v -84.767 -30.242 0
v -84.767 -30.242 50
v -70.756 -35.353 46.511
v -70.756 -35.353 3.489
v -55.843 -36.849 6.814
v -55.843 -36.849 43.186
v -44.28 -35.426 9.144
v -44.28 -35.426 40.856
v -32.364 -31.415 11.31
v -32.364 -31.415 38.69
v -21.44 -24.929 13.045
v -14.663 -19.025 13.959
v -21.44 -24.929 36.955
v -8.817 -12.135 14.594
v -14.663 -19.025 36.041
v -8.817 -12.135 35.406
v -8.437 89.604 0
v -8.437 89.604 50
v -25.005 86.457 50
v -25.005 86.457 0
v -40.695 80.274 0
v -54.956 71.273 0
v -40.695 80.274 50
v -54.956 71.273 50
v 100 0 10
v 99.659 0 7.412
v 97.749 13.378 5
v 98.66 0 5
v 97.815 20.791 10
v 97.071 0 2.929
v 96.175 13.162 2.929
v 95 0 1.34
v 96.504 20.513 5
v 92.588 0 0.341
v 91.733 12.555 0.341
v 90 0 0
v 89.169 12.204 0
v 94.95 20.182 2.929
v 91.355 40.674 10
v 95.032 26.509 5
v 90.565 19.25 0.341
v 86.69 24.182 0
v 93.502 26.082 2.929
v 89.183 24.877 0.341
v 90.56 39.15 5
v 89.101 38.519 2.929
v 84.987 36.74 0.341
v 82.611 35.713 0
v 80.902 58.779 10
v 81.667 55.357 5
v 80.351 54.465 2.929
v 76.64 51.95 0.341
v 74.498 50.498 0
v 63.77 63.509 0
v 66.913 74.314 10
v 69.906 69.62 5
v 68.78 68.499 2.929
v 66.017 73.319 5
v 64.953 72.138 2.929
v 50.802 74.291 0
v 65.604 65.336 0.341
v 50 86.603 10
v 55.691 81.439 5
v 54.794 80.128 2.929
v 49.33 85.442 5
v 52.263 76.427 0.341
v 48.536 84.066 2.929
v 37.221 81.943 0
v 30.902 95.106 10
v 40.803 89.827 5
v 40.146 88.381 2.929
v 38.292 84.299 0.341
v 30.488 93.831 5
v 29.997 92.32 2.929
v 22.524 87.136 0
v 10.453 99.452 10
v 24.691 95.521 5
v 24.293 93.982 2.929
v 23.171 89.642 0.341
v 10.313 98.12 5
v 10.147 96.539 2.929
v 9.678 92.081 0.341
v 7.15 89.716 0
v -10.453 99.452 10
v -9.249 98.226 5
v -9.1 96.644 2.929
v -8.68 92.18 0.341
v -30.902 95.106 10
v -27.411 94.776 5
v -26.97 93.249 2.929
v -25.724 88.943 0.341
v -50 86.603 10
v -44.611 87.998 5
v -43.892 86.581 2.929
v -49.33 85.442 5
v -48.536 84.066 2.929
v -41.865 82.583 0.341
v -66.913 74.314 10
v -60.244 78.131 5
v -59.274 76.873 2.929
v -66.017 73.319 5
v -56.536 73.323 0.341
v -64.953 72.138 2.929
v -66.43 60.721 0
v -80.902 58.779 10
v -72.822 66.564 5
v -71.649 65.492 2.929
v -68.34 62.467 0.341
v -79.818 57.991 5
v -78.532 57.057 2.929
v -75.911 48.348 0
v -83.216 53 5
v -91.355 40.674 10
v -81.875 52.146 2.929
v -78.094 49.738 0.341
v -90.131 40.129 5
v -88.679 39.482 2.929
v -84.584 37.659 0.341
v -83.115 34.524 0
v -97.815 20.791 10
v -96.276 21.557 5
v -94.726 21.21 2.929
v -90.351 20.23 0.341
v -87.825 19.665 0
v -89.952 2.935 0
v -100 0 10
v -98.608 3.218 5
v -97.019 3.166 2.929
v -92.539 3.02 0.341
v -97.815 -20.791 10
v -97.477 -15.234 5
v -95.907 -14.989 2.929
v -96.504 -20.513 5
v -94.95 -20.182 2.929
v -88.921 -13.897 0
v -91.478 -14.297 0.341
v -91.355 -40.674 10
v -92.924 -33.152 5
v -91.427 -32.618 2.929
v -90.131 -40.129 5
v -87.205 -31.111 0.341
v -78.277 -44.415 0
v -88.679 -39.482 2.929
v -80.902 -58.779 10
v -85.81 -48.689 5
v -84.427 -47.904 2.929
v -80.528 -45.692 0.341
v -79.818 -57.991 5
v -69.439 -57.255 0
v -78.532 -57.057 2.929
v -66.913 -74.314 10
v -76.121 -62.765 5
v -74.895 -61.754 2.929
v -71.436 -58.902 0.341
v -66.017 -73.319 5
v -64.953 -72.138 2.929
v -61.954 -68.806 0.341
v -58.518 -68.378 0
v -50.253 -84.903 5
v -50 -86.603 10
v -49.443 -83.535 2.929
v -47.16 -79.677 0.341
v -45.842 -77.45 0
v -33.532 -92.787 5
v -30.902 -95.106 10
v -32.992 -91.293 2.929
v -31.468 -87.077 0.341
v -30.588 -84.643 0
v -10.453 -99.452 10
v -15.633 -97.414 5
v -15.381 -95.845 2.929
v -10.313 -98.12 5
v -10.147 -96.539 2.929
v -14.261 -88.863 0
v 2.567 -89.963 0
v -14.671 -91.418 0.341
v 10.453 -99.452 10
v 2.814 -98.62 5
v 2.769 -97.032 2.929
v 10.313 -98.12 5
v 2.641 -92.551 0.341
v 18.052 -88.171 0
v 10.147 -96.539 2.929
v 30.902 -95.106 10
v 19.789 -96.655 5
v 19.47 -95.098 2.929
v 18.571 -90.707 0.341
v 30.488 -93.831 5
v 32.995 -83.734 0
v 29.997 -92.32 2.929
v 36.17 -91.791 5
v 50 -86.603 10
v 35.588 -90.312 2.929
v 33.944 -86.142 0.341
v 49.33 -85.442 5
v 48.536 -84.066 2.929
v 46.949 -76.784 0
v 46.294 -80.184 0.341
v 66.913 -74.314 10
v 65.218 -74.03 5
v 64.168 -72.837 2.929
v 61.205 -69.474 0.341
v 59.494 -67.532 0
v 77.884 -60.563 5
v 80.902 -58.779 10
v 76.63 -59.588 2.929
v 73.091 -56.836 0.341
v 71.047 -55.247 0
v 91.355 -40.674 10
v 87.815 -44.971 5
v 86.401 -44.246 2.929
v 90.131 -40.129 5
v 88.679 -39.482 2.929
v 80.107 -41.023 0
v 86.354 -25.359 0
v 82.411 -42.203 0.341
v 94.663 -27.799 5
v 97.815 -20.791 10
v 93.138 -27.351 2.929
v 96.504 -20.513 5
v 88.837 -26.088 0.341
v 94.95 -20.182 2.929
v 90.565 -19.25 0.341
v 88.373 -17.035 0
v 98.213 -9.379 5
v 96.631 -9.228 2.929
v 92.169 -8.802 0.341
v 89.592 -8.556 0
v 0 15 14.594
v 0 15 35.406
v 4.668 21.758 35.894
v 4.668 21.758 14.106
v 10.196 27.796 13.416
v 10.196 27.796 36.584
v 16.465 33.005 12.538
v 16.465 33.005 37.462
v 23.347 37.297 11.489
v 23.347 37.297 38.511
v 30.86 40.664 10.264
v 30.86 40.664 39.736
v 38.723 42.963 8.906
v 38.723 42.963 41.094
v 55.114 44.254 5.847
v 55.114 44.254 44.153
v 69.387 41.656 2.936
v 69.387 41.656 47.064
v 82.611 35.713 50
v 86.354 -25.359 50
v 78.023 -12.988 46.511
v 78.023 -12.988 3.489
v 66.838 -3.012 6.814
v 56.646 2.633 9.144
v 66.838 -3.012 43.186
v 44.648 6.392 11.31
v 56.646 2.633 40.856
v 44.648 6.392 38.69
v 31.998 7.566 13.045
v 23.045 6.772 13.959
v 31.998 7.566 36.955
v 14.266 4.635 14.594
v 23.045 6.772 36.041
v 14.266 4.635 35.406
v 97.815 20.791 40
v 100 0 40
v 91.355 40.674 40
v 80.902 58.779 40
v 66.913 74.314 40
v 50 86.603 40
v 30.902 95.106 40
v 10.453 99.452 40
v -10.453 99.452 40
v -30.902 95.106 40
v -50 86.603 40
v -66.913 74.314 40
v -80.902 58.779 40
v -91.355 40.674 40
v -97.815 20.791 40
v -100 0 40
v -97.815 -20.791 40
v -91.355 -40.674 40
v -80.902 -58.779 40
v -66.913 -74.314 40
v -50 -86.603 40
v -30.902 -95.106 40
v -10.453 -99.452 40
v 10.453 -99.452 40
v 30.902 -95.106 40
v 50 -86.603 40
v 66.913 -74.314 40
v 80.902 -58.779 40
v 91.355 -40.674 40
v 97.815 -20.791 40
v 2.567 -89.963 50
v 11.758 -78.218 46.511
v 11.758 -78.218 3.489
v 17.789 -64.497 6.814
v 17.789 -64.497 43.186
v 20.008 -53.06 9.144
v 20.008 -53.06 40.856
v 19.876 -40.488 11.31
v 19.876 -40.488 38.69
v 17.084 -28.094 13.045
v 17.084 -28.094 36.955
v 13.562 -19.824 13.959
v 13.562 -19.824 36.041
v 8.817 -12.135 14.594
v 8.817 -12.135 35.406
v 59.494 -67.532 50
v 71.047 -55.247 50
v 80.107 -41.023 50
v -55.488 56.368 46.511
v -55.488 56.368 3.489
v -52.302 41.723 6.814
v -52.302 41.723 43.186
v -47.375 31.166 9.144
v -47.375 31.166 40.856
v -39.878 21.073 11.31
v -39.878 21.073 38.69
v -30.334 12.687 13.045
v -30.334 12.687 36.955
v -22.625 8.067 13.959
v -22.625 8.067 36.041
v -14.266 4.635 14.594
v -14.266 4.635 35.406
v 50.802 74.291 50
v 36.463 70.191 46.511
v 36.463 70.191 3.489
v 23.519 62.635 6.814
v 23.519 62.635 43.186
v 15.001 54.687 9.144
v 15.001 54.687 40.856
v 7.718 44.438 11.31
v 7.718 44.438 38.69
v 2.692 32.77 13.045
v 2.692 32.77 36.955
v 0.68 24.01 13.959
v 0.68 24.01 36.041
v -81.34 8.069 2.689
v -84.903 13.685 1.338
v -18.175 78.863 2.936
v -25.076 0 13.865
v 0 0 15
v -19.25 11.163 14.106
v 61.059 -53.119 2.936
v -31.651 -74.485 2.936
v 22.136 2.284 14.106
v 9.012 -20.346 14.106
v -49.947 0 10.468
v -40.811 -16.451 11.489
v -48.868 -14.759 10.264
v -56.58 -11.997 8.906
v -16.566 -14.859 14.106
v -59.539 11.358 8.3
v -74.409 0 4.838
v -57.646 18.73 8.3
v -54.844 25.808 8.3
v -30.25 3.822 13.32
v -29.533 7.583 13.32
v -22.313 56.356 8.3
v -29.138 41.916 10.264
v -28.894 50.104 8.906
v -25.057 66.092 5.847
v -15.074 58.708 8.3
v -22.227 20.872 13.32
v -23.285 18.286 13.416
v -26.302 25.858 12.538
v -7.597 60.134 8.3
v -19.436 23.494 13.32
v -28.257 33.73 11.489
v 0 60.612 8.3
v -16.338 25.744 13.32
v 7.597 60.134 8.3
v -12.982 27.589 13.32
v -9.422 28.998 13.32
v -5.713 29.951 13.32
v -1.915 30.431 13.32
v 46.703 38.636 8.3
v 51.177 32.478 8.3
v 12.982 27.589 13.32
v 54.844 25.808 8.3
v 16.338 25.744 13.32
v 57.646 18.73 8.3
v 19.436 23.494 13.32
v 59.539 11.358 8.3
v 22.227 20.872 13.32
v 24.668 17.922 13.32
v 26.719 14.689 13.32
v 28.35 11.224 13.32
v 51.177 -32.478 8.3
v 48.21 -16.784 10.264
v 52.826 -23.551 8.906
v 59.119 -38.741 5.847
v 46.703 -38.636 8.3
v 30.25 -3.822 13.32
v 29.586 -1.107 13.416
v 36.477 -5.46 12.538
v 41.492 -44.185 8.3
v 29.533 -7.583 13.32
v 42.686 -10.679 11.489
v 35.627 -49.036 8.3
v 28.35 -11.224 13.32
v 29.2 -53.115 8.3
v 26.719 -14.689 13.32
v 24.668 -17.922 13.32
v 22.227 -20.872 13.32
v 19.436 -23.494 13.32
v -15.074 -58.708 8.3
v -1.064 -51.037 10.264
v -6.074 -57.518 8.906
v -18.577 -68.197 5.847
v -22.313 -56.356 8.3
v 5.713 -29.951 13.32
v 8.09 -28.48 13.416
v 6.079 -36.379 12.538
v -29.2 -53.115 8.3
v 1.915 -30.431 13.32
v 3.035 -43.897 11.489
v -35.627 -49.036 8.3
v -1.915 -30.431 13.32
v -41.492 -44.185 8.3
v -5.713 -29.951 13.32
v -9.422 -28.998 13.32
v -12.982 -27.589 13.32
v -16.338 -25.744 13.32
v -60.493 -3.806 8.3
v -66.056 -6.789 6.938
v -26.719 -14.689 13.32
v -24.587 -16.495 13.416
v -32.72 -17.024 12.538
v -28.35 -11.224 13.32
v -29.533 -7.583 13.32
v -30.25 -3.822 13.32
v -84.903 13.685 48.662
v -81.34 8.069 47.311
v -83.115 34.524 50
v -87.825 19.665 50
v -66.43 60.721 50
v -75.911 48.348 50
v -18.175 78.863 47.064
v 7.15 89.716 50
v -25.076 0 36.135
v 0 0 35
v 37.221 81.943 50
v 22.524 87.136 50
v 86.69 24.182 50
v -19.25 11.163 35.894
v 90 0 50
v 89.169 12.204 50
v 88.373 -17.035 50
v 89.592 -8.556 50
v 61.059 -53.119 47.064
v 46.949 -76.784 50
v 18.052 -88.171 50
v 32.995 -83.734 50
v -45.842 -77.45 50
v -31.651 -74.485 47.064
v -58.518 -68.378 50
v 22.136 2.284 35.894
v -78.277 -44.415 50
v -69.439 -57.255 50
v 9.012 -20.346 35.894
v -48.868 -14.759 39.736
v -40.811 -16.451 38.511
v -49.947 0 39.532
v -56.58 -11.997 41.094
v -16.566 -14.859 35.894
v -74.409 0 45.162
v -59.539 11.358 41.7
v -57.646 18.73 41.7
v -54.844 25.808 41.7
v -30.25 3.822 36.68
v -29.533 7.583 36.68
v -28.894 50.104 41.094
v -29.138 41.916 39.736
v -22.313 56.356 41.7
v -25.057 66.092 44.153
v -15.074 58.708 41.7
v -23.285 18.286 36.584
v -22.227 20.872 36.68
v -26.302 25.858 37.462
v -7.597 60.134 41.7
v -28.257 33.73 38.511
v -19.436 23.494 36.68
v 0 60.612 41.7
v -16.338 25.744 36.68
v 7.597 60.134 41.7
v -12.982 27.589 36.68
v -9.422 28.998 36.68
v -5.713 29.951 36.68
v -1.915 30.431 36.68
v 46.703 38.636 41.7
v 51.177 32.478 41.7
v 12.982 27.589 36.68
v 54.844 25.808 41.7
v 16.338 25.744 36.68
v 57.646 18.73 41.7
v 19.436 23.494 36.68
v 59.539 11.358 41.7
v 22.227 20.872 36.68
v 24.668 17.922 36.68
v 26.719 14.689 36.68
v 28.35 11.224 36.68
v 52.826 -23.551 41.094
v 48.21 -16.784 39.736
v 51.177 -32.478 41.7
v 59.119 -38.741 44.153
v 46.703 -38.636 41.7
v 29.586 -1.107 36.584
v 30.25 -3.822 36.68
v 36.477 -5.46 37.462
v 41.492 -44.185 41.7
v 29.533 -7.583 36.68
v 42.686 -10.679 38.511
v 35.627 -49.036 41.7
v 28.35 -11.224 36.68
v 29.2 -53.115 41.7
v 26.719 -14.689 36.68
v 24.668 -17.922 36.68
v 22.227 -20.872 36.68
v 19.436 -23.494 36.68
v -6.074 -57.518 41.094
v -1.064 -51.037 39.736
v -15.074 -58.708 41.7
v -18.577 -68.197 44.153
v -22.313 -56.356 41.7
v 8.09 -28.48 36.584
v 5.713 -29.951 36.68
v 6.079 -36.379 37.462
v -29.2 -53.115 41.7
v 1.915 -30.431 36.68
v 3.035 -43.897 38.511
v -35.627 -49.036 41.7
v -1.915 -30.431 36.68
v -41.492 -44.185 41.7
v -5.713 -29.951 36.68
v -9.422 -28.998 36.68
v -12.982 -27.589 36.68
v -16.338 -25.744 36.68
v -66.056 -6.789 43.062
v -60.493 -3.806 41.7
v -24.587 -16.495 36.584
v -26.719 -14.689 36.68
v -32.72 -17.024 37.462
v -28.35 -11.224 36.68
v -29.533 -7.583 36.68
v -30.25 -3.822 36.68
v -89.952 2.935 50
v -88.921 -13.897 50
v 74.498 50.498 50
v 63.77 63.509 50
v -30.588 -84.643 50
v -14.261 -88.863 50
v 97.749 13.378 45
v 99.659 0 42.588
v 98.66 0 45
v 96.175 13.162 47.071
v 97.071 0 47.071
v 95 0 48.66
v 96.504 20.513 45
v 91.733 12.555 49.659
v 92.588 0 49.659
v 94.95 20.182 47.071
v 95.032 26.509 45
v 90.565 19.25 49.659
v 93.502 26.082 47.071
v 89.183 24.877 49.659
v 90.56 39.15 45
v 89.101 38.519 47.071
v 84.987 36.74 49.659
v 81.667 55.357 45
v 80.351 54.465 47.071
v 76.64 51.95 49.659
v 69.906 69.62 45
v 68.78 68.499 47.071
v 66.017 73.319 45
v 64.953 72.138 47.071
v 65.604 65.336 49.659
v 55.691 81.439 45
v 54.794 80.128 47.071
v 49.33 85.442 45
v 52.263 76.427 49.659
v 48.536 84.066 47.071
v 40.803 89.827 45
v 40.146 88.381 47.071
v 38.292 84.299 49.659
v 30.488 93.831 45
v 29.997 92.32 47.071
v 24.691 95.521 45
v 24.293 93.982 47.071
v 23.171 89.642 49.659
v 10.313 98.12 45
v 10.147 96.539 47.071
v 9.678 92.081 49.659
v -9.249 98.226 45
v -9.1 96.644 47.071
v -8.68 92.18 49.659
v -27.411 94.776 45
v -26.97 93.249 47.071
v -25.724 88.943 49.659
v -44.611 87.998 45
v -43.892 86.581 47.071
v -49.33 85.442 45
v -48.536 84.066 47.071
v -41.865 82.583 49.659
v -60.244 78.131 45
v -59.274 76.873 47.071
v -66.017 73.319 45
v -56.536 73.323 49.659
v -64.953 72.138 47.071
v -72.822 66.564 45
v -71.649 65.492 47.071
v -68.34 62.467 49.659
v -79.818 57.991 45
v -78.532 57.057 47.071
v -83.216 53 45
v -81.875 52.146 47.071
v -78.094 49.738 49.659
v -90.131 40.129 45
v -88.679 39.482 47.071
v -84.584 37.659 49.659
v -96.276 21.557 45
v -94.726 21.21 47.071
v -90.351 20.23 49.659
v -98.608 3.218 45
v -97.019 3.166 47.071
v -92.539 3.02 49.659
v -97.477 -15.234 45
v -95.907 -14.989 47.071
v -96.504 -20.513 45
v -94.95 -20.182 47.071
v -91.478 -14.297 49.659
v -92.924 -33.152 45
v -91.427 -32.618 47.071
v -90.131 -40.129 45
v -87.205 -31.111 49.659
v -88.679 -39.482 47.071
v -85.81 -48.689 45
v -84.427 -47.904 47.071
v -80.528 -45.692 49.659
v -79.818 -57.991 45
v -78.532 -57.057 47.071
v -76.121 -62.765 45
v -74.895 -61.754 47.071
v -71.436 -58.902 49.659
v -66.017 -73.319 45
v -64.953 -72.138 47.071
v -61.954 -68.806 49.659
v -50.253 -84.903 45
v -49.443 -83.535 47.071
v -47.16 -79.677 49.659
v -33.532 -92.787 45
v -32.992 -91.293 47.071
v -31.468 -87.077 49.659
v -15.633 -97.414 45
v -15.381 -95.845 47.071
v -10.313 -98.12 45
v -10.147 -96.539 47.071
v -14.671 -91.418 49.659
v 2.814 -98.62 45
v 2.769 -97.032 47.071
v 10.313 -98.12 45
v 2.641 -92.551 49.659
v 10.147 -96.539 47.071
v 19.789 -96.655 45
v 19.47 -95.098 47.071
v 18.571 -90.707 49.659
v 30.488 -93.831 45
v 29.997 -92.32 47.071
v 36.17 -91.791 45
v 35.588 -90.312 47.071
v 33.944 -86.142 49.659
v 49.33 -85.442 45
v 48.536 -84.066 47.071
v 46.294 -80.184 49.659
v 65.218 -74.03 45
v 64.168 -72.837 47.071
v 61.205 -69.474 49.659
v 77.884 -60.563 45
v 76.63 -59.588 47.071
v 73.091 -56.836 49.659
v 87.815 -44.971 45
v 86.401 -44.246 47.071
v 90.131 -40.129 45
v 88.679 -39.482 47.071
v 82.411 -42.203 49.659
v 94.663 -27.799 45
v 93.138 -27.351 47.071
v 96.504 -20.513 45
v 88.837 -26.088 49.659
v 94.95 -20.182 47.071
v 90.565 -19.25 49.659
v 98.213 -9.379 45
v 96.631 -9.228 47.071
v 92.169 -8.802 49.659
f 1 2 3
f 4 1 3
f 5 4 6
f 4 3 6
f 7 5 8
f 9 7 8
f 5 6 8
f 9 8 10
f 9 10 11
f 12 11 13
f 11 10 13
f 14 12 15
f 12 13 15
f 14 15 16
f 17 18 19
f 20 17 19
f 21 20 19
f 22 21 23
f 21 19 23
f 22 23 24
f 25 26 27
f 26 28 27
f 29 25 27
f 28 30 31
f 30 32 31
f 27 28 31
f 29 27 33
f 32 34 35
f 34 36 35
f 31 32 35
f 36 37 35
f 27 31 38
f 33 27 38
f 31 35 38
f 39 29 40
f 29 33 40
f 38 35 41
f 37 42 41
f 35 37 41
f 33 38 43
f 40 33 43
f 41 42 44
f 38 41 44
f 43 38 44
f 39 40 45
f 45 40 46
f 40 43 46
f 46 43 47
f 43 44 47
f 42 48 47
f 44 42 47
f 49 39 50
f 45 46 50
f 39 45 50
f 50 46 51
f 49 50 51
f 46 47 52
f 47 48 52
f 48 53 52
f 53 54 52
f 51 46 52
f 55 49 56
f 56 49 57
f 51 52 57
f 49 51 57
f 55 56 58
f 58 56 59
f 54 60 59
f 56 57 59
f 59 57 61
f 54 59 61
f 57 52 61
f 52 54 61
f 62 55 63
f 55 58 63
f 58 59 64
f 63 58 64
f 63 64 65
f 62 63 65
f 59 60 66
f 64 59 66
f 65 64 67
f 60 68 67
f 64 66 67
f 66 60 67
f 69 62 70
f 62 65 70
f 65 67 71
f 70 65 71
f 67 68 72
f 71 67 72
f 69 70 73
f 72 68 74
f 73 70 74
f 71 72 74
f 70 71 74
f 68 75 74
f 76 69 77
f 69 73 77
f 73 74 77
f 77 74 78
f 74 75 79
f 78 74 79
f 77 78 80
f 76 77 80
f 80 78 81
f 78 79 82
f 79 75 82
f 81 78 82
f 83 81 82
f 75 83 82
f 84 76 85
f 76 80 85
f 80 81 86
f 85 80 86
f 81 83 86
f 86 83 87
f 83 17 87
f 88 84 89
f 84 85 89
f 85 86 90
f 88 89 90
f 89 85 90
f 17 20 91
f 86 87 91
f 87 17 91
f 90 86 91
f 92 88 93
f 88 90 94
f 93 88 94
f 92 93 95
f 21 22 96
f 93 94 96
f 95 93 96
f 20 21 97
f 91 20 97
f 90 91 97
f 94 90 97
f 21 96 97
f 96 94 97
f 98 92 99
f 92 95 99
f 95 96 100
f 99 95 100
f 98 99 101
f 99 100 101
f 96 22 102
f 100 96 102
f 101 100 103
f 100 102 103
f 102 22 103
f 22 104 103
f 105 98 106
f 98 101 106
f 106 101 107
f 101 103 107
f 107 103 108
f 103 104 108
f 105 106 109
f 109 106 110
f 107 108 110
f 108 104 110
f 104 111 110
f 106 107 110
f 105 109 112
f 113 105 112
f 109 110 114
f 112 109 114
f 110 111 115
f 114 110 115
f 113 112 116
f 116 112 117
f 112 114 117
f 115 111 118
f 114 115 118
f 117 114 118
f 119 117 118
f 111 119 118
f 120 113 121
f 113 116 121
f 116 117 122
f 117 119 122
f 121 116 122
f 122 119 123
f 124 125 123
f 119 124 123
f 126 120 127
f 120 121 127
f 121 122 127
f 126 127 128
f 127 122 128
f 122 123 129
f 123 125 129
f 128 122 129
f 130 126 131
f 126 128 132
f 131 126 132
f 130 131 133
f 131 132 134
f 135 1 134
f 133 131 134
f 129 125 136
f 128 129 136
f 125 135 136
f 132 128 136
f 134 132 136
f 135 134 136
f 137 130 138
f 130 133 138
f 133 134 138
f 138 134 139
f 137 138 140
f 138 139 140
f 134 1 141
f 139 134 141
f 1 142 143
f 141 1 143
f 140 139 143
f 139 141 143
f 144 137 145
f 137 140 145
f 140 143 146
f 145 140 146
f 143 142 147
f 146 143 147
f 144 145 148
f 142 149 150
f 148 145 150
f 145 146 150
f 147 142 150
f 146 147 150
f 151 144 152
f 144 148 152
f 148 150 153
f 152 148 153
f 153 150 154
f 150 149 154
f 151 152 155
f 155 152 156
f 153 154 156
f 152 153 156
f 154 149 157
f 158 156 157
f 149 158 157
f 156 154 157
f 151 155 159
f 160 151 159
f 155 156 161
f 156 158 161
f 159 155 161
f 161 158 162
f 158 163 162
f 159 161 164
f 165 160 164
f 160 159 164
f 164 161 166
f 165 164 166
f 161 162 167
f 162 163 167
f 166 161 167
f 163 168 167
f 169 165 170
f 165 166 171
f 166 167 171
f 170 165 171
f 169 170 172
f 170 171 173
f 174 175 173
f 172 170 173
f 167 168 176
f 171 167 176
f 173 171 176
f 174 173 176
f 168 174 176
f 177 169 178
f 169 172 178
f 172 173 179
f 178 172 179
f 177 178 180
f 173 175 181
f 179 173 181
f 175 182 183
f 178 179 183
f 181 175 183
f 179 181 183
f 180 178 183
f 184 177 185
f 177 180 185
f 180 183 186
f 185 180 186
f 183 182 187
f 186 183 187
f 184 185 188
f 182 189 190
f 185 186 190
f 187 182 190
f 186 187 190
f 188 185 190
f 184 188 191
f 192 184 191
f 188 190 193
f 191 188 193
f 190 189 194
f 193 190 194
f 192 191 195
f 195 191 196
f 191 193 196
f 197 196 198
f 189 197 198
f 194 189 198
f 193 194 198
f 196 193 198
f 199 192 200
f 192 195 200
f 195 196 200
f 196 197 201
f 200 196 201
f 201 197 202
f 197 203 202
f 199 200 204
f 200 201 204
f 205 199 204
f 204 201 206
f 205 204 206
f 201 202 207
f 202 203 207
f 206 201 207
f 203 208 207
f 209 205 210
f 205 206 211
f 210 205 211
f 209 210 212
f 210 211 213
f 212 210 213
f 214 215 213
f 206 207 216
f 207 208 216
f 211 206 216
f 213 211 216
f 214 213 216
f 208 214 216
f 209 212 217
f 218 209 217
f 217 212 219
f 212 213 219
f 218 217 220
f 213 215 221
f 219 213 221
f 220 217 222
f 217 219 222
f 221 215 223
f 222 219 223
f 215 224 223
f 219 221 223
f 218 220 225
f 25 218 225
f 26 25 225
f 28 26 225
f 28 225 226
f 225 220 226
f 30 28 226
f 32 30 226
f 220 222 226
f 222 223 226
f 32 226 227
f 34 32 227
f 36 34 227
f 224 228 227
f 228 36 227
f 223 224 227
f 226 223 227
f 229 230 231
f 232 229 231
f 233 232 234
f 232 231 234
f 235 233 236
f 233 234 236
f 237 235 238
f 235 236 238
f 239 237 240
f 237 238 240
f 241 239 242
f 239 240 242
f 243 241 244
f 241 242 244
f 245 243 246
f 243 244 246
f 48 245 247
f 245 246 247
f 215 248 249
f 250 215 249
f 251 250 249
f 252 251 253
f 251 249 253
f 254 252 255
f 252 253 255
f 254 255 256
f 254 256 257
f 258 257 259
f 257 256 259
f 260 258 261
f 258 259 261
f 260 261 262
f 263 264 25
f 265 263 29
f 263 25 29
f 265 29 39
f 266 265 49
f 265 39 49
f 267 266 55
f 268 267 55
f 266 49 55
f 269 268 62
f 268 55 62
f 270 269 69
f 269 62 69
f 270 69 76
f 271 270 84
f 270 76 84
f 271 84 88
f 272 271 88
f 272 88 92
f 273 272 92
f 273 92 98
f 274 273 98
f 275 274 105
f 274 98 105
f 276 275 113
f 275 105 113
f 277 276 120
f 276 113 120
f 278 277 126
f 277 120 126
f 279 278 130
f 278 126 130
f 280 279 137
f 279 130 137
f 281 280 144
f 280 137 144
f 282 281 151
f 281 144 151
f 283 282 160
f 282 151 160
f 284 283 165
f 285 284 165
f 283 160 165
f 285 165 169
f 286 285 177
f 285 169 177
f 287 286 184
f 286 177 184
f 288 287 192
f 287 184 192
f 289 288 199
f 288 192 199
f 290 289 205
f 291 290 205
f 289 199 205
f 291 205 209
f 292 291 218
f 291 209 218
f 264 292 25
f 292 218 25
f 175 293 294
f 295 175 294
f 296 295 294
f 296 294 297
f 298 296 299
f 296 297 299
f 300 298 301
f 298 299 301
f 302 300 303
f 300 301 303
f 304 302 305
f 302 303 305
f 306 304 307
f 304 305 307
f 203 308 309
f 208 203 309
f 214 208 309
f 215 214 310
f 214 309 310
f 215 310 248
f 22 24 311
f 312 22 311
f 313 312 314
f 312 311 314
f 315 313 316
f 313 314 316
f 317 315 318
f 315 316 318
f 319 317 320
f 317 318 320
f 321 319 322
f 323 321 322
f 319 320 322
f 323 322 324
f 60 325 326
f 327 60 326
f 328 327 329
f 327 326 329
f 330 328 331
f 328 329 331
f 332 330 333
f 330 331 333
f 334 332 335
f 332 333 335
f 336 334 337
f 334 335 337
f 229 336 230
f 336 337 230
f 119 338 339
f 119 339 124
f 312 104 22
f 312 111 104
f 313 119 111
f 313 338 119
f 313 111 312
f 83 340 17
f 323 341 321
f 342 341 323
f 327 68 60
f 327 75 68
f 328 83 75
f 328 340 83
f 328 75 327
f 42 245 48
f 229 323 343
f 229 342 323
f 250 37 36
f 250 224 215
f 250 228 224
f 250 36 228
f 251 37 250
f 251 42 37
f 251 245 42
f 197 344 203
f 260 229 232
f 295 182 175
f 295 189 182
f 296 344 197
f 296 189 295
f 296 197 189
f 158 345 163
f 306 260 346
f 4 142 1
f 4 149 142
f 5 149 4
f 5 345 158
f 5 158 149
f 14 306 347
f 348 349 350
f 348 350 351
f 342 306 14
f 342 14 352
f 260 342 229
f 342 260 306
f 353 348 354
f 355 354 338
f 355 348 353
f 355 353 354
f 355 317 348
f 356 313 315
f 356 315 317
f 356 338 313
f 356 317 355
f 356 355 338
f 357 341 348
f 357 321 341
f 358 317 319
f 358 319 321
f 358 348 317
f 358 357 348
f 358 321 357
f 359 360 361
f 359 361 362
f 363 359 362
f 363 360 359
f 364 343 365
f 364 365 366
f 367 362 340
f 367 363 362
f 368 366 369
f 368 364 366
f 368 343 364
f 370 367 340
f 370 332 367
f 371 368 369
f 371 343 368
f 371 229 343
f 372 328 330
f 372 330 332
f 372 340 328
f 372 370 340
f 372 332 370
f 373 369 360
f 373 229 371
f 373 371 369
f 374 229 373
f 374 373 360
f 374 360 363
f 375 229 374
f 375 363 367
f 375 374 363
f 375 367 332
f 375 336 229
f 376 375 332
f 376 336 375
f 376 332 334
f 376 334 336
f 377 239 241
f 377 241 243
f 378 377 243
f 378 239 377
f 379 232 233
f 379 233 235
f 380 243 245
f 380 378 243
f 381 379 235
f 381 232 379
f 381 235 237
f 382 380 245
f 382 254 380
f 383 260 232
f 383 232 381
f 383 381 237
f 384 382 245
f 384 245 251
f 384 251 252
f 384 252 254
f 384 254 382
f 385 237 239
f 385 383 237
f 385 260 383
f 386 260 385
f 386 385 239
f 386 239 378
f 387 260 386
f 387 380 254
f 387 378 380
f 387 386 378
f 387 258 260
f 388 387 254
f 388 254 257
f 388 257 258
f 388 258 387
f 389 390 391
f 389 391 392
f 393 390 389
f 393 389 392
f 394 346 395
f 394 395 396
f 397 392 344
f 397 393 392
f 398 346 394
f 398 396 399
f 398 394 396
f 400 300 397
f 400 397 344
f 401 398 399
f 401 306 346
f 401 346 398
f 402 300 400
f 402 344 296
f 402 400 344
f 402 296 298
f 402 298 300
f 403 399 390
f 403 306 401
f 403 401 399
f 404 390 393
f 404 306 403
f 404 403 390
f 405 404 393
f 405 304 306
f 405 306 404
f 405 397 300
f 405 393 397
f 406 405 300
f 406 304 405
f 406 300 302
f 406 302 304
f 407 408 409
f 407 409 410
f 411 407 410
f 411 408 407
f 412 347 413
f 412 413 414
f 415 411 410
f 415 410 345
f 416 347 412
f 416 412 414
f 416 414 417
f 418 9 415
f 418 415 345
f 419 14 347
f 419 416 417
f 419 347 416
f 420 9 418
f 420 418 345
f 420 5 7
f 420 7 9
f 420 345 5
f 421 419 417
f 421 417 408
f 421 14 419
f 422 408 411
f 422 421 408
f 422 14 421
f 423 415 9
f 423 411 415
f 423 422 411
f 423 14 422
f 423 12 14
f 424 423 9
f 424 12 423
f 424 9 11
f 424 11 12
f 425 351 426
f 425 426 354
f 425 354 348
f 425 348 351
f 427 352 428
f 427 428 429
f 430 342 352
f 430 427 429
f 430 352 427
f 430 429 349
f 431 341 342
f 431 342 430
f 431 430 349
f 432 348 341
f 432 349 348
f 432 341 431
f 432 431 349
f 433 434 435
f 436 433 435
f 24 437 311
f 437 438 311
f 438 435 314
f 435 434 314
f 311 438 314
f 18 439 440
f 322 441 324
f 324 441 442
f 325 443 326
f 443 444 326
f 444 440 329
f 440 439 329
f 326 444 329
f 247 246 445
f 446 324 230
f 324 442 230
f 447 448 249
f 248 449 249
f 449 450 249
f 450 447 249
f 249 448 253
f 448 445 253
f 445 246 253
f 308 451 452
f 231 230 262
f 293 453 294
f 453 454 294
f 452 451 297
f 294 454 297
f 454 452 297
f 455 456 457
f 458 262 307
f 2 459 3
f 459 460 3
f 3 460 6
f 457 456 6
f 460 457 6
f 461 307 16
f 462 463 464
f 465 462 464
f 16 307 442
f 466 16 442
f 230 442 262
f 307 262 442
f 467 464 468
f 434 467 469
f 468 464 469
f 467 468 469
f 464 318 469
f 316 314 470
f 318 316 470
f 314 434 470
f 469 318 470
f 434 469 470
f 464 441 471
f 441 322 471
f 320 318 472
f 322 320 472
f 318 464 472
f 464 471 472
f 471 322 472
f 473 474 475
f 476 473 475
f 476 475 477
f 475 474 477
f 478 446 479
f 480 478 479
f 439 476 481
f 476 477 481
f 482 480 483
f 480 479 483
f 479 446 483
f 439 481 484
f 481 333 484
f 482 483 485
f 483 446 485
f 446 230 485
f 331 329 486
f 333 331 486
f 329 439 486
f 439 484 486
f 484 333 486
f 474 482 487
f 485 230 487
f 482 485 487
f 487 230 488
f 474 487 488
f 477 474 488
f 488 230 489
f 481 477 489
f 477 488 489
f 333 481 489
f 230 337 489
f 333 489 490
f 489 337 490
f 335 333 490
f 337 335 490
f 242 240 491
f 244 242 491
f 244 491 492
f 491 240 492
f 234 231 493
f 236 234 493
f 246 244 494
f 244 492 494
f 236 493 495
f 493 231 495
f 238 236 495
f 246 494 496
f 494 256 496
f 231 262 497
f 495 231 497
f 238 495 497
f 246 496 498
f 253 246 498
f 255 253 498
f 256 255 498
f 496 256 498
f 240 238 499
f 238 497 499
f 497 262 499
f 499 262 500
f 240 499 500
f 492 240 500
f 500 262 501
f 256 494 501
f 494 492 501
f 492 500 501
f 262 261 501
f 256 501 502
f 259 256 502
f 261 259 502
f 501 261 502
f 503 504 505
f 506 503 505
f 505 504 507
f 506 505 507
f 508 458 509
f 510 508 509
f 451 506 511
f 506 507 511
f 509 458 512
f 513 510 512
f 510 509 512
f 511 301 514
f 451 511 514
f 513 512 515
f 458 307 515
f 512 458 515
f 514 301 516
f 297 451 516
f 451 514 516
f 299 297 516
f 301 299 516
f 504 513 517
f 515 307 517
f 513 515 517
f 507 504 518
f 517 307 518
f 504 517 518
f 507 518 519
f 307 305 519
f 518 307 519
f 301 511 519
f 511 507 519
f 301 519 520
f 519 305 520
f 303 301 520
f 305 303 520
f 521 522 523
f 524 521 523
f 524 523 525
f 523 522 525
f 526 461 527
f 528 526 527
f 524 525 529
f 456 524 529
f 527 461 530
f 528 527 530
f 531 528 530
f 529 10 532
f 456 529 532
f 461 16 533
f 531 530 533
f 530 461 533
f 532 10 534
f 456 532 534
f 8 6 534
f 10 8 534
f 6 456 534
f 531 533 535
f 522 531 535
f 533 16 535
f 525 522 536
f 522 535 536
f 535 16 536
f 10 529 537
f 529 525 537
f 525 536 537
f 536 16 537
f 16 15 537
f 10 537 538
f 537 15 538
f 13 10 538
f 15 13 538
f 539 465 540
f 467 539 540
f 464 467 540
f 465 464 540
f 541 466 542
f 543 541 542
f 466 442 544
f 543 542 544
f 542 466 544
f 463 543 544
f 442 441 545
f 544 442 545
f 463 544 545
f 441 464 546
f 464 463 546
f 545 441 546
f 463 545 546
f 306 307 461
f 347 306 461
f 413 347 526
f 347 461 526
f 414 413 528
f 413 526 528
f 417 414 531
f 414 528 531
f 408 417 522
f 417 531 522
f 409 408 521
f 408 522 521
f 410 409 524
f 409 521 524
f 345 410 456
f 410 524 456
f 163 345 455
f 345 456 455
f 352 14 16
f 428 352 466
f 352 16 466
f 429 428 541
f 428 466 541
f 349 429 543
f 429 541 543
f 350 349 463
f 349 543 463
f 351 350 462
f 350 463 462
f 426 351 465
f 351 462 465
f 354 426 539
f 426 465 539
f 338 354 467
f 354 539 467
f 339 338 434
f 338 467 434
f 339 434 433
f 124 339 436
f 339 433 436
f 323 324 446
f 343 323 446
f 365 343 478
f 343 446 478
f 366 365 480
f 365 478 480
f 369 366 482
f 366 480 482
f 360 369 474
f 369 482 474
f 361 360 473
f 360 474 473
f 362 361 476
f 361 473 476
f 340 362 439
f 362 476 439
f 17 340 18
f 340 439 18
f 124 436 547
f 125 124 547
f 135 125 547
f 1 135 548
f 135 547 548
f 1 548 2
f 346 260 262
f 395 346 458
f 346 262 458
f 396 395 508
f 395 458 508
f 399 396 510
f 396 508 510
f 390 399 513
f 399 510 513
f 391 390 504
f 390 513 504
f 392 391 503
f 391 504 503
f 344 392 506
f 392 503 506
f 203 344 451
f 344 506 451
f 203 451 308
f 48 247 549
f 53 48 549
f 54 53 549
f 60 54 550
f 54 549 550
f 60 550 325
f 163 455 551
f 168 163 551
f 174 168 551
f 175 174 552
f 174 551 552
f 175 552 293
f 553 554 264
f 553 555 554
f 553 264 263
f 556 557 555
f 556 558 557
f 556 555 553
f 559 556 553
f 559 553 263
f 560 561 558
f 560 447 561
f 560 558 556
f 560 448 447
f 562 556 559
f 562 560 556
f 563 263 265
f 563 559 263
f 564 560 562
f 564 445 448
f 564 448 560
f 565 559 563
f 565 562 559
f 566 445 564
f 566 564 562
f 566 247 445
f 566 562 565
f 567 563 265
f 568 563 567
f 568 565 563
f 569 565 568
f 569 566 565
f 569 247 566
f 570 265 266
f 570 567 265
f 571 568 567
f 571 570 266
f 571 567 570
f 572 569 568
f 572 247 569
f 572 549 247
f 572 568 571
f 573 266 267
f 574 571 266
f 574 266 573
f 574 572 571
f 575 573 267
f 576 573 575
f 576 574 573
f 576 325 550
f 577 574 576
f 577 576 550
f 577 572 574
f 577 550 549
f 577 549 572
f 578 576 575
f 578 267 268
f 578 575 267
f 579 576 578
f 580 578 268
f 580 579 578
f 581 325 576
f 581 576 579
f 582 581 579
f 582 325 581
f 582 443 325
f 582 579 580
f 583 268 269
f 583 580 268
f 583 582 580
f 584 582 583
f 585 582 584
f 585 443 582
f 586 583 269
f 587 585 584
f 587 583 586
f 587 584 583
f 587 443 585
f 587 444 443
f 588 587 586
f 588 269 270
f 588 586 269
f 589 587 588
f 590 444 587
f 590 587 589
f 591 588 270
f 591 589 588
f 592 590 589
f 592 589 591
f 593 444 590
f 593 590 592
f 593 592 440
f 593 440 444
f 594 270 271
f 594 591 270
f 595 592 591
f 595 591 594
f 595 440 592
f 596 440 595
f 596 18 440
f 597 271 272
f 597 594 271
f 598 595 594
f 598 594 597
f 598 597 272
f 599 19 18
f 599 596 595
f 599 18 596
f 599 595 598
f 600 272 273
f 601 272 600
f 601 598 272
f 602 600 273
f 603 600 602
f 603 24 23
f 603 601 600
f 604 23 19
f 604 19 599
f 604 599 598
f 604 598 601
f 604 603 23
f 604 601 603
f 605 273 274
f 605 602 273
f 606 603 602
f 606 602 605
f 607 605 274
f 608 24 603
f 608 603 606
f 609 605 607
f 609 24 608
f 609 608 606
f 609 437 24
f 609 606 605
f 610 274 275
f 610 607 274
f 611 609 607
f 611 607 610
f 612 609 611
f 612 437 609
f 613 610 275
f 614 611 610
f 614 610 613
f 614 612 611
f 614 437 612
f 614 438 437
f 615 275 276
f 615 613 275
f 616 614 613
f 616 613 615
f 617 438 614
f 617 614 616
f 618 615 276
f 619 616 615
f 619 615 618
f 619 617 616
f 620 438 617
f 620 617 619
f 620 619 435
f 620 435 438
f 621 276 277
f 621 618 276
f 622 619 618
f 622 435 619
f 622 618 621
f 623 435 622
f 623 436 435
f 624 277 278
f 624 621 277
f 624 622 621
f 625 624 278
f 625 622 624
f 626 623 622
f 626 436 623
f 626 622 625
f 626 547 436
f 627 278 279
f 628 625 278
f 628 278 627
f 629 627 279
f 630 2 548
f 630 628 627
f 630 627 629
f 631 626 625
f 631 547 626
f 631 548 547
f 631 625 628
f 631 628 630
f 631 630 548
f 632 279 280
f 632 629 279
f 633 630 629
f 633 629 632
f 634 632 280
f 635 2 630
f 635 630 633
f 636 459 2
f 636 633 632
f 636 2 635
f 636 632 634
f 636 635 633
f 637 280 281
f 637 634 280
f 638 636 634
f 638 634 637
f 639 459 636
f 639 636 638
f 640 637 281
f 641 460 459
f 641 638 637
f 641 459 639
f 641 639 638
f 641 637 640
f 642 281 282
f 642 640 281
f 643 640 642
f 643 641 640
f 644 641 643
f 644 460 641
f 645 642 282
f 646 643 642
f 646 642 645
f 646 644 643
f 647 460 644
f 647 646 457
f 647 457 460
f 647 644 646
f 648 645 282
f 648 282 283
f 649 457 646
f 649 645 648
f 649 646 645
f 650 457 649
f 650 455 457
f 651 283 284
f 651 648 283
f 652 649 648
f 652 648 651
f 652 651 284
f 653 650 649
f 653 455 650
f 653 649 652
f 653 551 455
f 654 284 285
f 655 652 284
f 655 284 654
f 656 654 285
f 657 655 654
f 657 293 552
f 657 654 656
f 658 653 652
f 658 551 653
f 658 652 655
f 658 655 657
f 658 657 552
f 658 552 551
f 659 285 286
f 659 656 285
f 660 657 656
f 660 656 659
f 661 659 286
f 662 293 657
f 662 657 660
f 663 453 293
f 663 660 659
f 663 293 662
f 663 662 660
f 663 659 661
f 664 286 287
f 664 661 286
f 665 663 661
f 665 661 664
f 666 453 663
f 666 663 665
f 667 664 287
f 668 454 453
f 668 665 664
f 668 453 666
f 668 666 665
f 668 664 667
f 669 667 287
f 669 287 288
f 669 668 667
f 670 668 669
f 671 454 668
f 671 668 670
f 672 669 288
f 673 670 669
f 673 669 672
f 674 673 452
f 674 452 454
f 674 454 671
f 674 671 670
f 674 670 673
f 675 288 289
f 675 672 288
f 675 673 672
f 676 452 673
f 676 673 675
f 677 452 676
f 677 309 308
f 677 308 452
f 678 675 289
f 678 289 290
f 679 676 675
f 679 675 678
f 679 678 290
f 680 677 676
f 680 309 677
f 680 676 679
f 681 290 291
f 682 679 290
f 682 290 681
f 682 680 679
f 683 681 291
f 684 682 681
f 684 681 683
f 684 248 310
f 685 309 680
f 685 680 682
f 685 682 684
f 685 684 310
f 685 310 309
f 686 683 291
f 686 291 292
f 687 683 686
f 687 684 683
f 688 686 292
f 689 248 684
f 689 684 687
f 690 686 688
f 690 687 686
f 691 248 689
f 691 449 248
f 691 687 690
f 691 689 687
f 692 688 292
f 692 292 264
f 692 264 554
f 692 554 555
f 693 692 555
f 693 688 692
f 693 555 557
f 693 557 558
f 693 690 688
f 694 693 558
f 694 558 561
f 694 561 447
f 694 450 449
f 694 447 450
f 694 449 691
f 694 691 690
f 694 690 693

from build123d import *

# Parameters (mm, degrees)
SKETCH1_R           = 100
BOSS_EXTRUDE1_DEPTH = 50
FILLET1_R           = 10
CUT_EXTRUDE1_DEPTH  = 51
CIRPATTERN1_COUNT   = 5


with BuildPart() as part:
    # Sketch1 → Boss-Extrude1 (new body)
    with BuildSketch(Plane.XY):
        Circle(SKETCH1_R)
    extrude(amount=BOSS_EXTRUDE1_DEPTH)

    # Fillet1
    fillet1_edges = [part.edges().sort_by_distance(p)[0] for p in [
        (-100, 0, 0),
        (-100, 0, 50),
    ]]
    fillet(fillet1_edges, radius=FILLET1_R)

    # Sketch2 → Cut-Extrude1 (cut, through all)
    with BuildSketch(Plane.XY.offset(50)):
        with BuildLine():
            ThreePointArc((50.802293201, 74.290827196), (14.437611959, 54.039323714), (0, 15))
            ThreePointArc((0, 15), (36.99293279, 42.556106586), (82.610843349, 35.713422703))
            ThreePointArc((82.610843349, 35.713422703), (69.439328089, 57.255390267), (50.802293201, 74.290827196))
        make_face()
    cut_extrude1 = extrude(amount=-CUT_EXTRUDE1_DEPTH, mode=Mode.SUBTRACT)

    # CirPattern1: Cut-Extrude1 ×5 about axis
    cirpattern1_axis = Axis((0, 0, 0), (0, 0, 1))
    for i in range(1, CIRPATTERN1_COUNT):
        add(cut_extrude1.rotate(cirpattern1_axis, i * 360 / CIRPATTERN1_COUNT), mode=Mode.SUBTRACT)

    # Sketch3 → Cut-Revolve1 (revolve, cut)
    with BuildSketch(Plane(origin=(0, 0, 0), x_dir=(1, 0, 0), z_dir=(0, 1, 0))):
        with BuildLine():
            Line((0, 0), (-90, 0))
            ThreePointArc((-90, 0), (-45.620718977, -11.224313863), (0, -15))
            Line((0, -15), (0, 0))
        make_face()
        with BuildLine():
            Line((0, -50), (-90, -50))
            ThreePointArc((-90, -50), (-45.620718977, -38.775686137), (0, -35))
            Line((0, -35), (0, -50))
        make_face()
    revolve(axis=Axis((0, 0, 50), (0, 0, -1)), mode=Mode.SUBTRACT)


solid = part.part
